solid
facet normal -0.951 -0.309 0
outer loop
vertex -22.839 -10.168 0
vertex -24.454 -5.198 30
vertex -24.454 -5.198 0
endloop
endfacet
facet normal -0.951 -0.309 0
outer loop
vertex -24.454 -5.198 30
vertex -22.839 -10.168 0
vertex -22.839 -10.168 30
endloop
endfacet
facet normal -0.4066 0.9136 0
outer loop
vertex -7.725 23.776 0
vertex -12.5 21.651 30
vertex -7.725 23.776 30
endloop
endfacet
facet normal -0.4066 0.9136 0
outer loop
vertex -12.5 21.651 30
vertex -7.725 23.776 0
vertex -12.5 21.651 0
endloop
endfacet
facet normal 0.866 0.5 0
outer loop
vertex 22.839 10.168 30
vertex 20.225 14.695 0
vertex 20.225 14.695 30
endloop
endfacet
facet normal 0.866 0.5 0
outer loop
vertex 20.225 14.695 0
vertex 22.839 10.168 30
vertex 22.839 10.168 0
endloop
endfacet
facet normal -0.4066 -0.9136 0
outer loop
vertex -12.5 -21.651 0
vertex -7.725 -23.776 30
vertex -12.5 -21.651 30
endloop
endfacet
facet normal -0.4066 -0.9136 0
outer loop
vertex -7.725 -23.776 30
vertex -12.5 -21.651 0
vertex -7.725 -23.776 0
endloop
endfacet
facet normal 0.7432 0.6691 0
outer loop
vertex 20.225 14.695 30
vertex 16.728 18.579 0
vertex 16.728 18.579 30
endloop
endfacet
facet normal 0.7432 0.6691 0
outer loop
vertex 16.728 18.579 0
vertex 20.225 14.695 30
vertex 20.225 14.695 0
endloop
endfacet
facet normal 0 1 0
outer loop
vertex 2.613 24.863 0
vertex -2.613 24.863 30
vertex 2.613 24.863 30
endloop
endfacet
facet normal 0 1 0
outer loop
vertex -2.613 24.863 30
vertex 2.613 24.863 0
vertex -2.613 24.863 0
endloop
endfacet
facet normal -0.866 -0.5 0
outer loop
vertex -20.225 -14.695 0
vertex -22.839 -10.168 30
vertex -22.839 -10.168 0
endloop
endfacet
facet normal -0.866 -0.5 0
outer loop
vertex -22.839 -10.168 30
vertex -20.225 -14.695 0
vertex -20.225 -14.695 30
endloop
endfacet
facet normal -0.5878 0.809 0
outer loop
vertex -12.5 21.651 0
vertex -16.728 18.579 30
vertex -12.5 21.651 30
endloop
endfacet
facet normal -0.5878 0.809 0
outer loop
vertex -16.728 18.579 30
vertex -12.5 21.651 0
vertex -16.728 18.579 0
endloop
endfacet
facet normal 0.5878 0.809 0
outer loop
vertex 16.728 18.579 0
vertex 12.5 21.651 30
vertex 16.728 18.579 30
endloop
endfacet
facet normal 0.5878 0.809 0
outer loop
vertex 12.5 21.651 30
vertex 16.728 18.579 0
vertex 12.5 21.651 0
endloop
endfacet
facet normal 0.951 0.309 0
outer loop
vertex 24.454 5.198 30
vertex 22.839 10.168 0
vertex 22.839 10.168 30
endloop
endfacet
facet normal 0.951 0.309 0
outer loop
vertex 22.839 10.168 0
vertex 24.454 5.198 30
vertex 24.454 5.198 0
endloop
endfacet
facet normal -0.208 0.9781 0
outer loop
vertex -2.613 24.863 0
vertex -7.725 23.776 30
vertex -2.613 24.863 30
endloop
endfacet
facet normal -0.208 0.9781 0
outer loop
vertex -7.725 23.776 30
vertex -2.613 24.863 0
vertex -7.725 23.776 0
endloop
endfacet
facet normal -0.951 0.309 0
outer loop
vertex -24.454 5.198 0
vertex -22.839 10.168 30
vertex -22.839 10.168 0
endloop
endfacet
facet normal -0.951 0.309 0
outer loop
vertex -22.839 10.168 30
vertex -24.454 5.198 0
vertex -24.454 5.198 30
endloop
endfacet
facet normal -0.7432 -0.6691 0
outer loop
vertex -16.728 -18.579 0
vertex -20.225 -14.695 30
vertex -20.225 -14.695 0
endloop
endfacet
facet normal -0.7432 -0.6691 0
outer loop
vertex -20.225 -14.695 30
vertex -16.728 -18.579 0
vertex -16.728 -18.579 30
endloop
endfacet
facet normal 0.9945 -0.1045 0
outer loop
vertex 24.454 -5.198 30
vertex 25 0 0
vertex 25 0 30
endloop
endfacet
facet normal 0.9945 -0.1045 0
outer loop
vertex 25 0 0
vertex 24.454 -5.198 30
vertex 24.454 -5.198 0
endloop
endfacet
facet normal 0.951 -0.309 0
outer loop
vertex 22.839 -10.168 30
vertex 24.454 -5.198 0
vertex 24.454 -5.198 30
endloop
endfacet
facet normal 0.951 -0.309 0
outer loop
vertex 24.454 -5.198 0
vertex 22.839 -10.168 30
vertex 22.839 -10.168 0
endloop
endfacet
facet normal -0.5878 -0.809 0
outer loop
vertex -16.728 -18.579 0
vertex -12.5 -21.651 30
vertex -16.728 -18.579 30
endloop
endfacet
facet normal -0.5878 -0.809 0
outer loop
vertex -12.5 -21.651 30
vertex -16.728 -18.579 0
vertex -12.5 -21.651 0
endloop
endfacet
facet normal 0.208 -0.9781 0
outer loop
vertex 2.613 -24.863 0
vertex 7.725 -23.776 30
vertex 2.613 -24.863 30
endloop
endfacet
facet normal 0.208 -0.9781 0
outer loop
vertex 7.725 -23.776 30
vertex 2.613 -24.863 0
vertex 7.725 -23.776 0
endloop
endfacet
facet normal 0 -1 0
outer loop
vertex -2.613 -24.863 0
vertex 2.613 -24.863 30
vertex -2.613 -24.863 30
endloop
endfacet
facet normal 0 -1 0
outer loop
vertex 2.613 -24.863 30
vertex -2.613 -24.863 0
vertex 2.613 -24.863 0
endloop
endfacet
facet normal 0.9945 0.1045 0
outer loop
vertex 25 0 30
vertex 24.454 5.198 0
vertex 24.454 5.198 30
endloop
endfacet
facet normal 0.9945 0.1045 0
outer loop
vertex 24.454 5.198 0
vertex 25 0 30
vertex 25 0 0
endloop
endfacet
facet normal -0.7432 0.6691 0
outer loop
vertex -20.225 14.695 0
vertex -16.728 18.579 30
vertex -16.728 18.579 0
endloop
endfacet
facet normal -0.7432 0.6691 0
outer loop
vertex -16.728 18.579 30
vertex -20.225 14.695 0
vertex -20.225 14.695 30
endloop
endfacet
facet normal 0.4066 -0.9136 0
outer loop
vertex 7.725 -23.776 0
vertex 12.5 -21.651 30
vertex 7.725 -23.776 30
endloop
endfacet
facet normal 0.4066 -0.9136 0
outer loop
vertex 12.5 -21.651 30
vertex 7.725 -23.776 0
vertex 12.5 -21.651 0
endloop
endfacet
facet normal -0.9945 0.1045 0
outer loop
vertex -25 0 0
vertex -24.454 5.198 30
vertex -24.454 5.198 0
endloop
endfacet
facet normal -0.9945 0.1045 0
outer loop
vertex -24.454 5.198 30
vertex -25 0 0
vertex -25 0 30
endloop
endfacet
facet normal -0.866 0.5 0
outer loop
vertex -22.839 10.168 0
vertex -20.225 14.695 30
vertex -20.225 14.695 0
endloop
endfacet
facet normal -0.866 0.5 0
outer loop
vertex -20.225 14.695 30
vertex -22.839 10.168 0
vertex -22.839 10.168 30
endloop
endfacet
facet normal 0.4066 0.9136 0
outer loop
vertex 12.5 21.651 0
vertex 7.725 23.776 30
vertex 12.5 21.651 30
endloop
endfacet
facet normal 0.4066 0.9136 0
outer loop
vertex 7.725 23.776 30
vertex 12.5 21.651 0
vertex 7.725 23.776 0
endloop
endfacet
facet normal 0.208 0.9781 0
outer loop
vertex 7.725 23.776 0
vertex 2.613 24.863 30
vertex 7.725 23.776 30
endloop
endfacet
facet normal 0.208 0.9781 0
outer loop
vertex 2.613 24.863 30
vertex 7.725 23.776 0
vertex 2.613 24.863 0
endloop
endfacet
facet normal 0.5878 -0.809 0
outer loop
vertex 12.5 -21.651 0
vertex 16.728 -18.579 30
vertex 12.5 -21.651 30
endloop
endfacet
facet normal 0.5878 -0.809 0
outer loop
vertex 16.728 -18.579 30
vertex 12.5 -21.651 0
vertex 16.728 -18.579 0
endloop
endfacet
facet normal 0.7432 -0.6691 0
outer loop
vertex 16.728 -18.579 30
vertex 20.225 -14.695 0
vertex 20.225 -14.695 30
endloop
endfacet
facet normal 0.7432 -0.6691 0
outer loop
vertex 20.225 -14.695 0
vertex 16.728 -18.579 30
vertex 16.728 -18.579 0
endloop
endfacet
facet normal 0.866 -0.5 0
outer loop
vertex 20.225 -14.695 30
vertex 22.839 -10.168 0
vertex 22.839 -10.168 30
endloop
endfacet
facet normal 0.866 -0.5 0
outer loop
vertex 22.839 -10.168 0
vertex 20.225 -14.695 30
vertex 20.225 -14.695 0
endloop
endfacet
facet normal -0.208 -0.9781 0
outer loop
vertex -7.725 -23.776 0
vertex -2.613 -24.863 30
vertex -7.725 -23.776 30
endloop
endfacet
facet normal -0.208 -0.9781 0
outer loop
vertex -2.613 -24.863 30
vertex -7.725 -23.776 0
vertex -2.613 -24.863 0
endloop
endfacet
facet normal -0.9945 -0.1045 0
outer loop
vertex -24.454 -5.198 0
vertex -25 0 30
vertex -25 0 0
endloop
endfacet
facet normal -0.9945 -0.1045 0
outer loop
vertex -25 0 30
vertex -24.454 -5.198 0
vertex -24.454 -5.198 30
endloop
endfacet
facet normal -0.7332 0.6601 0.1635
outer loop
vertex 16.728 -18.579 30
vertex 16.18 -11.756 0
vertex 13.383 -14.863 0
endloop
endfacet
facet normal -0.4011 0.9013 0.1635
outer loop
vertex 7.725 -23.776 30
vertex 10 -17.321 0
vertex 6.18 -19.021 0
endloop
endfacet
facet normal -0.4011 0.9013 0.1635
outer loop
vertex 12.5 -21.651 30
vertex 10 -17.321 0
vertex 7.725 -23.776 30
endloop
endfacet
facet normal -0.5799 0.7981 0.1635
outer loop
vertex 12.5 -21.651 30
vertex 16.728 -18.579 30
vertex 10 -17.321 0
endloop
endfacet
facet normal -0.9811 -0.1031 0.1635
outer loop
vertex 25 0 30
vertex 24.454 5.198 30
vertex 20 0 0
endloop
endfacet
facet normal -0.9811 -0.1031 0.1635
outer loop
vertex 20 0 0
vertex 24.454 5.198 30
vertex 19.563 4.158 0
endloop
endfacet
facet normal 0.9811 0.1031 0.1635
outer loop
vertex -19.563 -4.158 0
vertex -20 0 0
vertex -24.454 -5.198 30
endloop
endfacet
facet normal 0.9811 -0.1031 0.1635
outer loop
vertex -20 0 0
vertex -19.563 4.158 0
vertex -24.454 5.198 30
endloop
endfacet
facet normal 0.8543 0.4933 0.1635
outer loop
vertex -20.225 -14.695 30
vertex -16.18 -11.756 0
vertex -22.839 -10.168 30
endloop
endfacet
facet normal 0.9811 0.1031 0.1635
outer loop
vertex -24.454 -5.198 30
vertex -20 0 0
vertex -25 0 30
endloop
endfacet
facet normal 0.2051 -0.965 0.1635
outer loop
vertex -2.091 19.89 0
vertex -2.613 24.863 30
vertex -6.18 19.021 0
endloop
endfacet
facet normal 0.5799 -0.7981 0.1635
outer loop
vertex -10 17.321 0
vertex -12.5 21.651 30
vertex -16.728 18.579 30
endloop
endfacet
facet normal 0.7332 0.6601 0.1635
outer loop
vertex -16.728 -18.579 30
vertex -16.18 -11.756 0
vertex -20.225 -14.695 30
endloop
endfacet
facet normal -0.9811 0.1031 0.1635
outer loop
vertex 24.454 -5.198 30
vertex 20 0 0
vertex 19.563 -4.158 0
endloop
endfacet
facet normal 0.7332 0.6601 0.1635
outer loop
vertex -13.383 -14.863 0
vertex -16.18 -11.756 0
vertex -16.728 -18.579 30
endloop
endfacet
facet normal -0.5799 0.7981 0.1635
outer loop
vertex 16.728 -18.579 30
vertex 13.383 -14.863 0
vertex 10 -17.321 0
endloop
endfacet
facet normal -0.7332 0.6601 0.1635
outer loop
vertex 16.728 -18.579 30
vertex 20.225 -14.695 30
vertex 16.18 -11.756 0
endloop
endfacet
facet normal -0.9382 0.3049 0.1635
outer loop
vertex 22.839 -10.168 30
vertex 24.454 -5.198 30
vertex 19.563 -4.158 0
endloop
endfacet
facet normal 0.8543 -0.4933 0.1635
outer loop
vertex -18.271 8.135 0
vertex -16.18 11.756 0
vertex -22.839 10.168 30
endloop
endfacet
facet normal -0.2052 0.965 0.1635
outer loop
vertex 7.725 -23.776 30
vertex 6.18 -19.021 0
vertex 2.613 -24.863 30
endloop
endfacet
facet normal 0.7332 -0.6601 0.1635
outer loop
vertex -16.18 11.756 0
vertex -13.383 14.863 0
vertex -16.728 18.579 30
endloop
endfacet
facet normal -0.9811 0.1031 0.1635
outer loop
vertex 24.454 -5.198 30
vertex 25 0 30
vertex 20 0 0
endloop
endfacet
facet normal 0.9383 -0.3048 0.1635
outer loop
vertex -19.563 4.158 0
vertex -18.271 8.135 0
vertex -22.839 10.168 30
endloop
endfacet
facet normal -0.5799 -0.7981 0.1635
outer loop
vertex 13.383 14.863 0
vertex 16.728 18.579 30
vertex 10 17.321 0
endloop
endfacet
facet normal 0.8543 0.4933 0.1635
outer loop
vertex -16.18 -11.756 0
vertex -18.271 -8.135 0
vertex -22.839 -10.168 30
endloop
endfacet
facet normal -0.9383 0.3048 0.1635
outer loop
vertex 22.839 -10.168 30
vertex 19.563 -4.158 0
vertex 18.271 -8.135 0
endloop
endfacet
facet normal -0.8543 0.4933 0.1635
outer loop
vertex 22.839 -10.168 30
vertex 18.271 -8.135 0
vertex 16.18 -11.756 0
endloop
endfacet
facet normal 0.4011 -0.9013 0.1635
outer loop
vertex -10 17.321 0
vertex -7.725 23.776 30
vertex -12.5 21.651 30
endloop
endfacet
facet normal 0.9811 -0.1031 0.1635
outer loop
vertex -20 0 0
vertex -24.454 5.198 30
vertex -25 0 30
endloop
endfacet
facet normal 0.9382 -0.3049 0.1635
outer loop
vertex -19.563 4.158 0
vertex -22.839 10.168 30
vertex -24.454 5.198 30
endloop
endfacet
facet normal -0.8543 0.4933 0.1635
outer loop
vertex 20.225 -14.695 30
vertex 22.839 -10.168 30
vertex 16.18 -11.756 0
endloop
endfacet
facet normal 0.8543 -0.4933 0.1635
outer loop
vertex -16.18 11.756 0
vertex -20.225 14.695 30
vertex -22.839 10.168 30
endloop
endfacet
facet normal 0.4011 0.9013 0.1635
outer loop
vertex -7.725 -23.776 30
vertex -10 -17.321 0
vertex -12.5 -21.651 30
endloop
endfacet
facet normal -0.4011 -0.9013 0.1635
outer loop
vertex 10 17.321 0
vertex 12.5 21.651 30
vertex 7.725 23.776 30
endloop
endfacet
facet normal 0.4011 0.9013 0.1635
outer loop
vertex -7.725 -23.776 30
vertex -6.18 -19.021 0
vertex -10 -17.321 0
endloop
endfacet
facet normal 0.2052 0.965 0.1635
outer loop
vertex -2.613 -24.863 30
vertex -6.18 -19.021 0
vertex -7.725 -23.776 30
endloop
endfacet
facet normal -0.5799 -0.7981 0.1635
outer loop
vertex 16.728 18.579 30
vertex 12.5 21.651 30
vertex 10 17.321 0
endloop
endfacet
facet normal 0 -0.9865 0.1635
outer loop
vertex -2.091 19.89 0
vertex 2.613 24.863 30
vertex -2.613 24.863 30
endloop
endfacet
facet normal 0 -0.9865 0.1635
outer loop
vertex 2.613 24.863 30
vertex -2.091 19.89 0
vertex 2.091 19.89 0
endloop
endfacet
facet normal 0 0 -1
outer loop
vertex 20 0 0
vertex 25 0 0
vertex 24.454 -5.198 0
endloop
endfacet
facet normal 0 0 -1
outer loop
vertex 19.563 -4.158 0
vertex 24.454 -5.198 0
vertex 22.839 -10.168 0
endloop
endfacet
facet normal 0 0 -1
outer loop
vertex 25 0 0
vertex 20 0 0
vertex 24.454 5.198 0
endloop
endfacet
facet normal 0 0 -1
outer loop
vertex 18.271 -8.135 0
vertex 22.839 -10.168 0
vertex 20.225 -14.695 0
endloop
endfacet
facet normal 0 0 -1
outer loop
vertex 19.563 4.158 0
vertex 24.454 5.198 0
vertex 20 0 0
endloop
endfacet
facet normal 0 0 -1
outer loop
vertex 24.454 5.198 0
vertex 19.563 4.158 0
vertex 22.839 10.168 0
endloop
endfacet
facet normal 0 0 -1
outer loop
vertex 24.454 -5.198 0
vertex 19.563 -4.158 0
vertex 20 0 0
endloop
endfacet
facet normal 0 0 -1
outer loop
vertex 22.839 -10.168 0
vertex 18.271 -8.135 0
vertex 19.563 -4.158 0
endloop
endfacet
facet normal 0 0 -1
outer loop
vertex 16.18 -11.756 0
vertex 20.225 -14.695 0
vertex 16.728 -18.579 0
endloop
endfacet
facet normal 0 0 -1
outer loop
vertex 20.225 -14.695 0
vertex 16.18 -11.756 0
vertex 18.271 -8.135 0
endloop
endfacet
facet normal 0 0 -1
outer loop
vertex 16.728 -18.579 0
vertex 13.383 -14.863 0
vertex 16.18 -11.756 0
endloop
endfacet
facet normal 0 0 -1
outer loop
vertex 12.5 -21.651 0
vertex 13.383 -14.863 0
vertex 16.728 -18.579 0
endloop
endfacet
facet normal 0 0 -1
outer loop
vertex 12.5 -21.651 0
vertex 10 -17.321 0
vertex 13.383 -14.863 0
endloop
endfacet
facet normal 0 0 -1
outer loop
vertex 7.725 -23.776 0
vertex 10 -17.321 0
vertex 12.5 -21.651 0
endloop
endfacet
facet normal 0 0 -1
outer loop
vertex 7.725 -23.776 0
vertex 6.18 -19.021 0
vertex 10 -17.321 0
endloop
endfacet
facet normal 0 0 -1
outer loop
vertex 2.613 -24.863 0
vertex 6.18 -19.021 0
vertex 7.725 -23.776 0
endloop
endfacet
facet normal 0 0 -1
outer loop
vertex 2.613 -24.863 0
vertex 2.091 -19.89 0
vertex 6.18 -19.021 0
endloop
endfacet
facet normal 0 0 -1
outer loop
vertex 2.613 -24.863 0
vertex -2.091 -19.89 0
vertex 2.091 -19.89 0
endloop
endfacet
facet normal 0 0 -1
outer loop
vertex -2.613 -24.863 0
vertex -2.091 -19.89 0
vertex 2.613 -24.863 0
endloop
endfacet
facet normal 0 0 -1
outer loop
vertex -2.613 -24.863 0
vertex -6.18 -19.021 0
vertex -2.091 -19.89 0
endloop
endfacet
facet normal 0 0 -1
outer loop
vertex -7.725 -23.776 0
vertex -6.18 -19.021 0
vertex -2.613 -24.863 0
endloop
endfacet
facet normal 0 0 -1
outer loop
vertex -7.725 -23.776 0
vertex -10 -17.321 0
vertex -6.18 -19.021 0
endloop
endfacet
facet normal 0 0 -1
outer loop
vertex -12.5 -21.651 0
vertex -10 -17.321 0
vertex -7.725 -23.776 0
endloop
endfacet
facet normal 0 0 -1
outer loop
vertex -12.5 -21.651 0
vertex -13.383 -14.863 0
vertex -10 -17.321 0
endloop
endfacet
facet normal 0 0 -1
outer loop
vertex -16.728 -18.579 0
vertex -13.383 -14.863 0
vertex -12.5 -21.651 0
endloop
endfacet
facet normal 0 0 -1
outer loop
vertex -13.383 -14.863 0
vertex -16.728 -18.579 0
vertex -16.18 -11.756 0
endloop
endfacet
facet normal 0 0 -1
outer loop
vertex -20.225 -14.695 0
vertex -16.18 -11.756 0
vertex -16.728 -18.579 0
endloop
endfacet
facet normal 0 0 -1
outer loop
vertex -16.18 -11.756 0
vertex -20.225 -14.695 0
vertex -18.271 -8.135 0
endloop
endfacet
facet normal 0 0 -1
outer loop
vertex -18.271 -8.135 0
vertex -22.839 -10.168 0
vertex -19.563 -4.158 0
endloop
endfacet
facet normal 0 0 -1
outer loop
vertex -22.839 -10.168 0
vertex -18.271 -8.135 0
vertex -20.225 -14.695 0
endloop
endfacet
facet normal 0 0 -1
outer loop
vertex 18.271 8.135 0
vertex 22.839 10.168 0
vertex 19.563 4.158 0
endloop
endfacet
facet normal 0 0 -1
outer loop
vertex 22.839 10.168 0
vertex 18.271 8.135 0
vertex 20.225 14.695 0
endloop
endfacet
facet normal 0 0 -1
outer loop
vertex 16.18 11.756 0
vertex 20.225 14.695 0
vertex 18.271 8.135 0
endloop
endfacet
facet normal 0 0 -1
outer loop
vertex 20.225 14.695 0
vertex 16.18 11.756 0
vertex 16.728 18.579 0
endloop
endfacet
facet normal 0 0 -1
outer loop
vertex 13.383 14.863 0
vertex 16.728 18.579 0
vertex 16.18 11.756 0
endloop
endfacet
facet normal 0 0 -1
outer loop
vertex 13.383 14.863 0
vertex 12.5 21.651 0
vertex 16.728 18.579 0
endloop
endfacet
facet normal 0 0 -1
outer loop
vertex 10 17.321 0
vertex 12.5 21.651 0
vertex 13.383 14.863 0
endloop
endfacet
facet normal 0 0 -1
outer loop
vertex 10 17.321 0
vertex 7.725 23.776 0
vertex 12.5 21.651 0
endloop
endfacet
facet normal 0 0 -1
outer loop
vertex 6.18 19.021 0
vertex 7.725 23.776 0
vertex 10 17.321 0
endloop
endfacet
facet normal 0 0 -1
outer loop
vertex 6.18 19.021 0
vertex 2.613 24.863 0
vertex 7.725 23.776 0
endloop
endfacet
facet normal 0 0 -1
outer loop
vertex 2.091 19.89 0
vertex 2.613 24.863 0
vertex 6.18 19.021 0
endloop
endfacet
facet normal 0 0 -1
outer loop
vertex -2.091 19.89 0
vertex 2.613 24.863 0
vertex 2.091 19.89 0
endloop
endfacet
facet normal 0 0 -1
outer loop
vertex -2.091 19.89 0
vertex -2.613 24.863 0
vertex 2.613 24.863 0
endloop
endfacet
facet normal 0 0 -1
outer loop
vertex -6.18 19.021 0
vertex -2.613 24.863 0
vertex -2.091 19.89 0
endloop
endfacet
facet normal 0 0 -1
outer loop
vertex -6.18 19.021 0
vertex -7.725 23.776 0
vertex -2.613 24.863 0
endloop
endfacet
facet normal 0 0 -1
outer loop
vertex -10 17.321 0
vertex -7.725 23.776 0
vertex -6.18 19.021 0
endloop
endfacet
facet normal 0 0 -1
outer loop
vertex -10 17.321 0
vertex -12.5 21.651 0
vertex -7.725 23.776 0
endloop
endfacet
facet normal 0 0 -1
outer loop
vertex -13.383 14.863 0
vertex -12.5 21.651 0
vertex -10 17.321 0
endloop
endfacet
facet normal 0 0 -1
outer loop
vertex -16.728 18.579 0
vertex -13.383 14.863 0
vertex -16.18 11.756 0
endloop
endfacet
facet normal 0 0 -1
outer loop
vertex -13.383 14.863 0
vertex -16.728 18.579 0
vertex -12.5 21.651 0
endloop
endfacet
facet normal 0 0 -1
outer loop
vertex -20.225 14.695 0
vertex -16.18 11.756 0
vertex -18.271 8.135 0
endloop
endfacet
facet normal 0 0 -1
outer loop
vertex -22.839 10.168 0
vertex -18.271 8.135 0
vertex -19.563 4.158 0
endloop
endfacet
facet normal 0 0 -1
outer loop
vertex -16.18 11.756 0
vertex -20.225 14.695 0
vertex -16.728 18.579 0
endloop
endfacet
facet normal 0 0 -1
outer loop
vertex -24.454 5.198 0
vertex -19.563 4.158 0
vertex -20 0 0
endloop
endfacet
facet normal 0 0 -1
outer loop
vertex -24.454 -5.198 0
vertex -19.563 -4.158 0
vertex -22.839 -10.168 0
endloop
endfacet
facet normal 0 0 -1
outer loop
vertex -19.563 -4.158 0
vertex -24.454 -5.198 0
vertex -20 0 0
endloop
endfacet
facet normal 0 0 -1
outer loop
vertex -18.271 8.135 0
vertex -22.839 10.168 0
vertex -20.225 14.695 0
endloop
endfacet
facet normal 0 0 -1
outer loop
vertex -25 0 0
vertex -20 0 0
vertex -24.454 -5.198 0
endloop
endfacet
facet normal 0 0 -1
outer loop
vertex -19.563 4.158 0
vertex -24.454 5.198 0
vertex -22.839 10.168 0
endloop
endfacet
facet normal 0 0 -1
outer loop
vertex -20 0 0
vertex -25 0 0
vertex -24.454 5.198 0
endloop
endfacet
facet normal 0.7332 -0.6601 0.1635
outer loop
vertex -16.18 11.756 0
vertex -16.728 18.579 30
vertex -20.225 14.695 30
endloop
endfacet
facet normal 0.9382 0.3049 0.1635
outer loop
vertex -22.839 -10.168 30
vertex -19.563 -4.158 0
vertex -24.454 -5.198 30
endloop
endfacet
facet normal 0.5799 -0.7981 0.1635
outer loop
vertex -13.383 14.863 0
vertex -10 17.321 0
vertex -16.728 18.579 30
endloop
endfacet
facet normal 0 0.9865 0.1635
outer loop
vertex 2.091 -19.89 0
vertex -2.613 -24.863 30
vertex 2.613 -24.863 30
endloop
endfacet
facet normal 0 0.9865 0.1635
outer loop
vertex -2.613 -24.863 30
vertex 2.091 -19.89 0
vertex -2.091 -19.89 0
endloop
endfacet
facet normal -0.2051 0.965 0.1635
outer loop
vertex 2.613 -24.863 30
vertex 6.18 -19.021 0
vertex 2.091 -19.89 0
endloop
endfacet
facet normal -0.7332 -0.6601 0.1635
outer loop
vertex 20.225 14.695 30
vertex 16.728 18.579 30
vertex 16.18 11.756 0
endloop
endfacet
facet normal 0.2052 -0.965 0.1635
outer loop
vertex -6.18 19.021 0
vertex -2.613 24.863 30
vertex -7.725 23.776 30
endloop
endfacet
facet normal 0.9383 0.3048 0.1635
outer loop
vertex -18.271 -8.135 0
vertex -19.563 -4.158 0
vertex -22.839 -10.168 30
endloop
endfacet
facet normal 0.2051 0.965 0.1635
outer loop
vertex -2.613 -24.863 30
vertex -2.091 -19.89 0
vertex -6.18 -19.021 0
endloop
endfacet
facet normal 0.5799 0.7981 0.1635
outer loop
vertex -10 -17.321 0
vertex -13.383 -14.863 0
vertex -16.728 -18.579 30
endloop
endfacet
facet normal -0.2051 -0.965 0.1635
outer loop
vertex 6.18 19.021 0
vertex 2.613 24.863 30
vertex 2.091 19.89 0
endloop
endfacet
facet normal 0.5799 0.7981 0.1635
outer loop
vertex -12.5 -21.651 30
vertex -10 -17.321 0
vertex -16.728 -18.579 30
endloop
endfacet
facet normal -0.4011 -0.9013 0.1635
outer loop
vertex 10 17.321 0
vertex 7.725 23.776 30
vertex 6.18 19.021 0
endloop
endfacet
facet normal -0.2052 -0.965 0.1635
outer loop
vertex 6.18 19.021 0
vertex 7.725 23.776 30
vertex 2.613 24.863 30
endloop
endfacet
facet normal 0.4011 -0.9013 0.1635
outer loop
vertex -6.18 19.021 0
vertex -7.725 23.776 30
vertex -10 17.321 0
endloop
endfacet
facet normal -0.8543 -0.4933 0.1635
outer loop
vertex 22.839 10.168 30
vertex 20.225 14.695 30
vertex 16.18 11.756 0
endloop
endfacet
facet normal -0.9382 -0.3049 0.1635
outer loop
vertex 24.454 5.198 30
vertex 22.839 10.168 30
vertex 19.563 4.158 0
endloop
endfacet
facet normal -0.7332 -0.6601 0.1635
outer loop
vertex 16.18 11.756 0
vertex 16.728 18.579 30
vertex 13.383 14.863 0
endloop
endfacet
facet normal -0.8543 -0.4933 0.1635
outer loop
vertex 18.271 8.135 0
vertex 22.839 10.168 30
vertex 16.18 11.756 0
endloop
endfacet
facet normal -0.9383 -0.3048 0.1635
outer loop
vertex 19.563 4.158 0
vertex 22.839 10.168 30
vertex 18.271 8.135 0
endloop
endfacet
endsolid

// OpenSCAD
module negative(h=210){
    difference(){
        #hull(){
            children();
            translate([0,0,-h]) children();
        }
        children();
        translate([0,0,-h])
            cube(h*2,center=true);
    }
}

negative(){
    cylinder(h=30,r1=20,r2=25);
}
